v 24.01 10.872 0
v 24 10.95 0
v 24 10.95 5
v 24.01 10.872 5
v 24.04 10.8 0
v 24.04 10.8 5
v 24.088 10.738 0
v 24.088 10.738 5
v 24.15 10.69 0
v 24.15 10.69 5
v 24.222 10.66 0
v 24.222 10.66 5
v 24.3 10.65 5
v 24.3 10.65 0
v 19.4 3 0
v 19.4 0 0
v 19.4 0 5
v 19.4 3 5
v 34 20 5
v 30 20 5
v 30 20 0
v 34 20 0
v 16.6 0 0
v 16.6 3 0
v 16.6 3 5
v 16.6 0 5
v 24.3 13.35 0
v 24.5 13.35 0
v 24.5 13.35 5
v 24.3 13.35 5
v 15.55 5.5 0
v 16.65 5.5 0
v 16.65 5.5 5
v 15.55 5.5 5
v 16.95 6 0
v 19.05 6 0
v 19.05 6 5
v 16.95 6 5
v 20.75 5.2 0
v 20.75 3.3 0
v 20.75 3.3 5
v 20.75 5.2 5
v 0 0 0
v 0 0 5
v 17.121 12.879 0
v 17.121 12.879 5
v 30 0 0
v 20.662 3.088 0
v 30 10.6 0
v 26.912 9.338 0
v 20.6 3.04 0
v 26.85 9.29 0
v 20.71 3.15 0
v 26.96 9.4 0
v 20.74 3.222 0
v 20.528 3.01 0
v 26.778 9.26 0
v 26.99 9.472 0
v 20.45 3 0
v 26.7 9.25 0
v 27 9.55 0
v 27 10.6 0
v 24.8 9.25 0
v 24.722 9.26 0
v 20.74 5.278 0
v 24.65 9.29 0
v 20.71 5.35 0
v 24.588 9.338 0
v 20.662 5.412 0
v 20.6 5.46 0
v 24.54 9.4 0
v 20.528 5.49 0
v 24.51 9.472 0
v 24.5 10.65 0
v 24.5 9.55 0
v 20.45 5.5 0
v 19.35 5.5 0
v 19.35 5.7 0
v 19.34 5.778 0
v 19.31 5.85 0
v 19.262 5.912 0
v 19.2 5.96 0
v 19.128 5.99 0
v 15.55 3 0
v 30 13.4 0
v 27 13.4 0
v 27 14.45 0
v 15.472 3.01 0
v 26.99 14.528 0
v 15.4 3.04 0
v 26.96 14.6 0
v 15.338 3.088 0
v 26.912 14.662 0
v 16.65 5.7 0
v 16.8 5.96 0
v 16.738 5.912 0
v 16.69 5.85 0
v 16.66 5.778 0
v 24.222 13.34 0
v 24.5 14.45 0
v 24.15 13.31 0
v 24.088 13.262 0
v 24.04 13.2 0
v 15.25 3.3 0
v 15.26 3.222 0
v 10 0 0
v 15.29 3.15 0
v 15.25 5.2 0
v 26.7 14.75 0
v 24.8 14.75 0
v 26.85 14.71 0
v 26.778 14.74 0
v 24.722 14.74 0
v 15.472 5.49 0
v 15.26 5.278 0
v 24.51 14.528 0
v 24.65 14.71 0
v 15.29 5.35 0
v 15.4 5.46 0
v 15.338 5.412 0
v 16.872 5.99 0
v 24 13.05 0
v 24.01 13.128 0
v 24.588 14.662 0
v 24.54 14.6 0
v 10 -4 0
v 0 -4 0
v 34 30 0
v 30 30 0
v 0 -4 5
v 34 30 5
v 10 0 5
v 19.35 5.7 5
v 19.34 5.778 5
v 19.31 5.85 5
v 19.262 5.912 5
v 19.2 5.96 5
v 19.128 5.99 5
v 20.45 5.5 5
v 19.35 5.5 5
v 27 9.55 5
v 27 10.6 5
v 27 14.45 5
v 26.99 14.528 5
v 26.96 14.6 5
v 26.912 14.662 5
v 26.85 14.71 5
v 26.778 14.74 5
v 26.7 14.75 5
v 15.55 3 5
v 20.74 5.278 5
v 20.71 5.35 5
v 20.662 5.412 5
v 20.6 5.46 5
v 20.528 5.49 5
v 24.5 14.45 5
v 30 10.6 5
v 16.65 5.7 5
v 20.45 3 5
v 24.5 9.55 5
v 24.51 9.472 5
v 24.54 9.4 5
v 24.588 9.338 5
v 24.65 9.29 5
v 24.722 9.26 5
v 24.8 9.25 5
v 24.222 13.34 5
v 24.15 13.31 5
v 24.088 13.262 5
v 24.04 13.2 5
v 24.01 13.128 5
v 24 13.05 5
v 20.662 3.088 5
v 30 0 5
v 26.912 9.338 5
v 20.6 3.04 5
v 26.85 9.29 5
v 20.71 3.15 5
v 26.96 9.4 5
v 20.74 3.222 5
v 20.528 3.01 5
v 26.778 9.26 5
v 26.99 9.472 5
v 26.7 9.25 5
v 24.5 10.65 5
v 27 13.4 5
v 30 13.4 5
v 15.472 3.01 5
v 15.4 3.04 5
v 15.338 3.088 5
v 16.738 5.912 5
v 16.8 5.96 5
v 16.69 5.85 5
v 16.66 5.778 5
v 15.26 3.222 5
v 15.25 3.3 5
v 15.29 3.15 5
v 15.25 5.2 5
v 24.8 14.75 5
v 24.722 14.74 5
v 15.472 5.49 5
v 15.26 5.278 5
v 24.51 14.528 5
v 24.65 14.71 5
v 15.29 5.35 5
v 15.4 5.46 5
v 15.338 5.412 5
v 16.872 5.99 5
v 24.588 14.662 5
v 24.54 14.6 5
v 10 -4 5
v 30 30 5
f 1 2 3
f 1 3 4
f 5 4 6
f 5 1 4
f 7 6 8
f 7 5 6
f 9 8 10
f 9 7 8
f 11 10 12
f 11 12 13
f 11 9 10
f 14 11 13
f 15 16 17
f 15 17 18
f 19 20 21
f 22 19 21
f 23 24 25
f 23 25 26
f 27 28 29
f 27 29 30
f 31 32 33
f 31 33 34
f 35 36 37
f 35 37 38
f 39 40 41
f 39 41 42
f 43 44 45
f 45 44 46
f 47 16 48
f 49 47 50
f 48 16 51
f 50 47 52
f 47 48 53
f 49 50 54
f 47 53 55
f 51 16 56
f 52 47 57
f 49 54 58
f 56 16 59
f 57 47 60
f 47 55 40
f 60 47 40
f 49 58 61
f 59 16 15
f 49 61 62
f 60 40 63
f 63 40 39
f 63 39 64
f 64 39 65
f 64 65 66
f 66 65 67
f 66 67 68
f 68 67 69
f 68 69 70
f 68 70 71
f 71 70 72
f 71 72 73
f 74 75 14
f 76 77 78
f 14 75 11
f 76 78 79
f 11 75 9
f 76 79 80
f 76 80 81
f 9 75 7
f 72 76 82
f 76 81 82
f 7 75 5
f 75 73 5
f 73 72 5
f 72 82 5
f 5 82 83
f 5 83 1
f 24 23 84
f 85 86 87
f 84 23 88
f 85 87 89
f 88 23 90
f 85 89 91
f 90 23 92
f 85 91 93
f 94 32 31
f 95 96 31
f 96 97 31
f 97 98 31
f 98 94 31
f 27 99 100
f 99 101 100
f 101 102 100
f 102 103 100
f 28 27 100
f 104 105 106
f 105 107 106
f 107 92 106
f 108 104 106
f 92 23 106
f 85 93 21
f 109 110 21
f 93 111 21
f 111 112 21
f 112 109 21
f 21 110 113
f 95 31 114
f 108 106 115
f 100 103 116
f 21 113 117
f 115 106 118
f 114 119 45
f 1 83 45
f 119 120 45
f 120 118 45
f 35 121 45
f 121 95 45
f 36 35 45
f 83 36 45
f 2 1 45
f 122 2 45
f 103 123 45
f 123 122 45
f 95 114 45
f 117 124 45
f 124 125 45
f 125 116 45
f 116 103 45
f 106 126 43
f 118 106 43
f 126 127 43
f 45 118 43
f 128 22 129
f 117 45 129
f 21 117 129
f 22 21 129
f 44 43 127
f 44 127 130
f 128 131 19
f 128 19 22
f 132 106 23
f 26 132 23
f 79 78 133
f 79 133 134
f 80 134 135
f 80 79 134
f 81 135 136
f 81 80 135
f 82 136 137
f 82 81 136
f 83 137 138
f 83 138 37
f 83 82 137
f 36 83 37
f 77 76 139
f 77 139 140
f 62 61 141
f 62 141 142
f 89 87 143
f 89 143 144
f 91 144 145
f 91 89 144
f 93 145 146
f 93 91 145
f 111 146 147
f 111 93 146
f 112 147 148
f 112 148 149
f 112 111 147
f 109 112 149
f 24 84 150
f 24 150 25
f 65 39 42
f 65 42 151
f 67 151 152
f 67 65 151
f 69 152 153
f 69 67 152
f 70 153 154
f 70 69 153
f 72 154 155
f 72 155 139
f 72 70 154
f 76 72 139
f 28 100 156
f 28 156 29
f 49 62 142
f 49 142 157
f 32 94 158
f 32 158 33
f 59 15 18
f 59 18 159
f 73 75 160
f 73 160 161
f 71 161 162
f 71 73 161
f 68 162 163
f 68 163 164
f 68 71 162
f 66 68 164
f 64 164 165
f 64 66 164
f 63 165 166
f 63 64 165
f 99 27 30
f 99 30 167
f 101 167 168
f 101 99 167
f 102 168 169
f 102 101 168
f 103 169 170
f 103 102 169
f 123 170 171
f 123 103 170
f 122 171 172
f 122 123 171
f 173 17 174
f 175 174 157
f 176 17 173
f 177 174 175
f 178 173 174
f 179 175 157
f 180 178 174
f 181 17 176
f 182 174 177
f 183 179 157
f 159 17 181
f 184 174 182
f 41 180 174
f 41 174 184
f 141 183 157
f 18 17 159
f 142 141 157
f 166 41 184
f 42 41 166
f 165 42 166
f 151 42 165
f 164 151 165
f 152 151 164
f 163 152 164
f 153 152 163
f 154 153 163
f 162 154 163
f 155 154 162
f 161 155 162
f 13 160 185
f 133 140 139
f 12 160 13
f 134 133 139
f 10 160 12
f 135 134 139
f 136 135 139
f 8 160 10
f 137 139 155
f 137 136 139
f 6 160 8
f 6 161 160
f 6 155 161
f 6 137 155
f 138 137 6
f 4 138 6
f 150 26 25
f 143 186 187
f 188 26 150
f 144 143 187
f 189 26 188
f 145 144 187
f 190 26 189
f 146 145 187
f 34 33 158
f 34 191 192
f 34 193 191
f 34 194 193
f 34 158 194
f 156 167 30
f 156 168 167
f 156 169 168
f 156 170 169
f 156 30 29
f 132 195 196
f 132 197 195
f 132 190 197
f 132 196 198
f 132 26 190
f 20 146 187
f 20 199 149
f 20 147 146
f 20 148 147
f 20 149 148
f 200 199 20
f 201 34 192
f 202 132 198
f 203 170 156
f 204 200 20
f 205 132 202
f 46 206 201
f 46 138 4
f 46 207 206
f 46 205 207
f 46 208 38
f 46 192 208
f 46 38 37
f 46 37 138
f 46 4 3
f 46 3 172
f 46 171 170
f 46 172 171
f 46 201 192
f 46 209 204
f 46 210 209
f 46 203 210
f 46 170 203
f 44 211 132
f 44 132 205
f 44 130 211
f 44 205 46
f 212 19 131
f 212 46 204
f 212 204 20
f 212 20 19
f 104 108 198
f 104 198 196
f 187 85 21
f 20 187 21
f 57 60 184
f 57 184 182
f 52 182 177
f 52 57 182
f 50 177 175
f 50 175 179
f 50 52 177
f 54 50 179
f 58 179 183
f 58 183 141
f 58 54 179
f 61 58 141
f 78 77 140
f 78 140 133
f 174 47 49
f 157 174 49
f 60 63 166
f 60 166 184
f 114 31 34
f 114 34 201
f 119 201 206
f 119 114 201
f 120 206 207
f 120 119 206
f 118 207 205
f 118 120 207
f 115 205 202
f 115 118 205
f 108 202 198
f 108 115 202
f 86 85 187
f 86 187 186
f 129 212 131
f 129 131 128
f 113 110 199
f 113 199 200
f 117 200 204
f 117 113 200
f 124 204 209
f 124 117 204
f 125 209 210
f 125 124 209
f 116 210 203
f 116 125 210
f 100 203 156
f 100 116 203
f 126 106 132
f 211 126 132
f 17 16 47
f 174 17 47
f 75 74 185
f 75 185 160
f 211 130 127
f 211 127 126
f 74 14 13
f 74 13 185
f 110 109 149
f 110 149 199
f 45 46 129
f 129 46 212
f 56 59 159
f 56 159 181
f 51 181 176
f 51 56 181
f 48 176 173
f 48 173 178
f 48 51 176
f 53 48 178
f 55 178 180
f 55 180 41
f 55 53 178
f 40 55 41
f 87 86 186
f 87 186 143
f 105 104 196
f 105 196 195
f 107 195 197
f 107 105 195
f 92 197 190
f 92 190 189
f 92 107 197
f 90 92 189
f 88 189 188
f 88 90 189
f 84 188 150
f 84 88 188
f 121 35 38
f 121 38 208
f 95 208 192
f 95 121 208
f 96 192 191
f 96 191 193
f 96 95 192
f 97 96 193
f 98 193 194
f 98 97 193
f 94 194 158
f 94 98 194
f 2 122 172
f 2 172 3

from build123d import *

# Parameters (mm, degrees)
EXTRUDE_1_DEPTH     = 5
CUT_EXTRUDE_1_DEPTH = 10
SKETCH_3_W          = 10
SKETCH_3_H          = 5
EXTRUDE_2_DEPTH     = 5
SKETCH_4_W          = 5
SKETCH_4_H          = 10
EXTRUDE_3_DEPTH     = 5
SKETCH_5_W          = 10
SKETCH_5_H          = 5
CUT_EXTRUDE_2_DEPTH = 1
SKETCH_6_W          = 5
SKETCH_6_H          = 10
CUT_EXTRUDE_3_DEPTH = 1
CUT_EXTRUDE_5_DEPTH = 5


with BuildPart() as part:
    # 草图1 → 凸台-拉伸1 (new body)
    with BuildSketch(Plane.XY):
        Polygon((0, 0), (30, 0), (30, 30), align=None)
    extrude(amount=EXTRUDE_1_DEPTH)

    # 草图2 → 切除-拉伸1 (cut)
    with BuildSketch(Plane.XY.offset(5)):
        Polygon((17.121320344, 12.878679656), (15, 15), (0, 0), align=None)
        Polygon((17.121320344, 12.878679656), (30, 30), (15, 15), align=None)
    extrude(amount=-CUT_EXTRUDE_1_DEPTH, mode=Mode.SUBTRACT)

    # 草图3 → 凸台-拉伸2 (add)
    with BuildSketch(Plane.XZ):
        with Locations((5, 2.5)):
            Rectangle(SKETCH_3_W, SKETCH_3_H)
    extrude(amount=EXTRUDE_2_DEPTH)

    # 草图4 → 凸台-拉伸3 (add)
    with BuildSketch(Plane(origin=(30, 0, 0), x_dir=(0, 0, -1), z_dir=(1, 0, 0))):
        with Locations((-2.5, 25)):
            Rectangle(SKETCH_4_W, SKETCH_4_H)
    extrude(amount=EXTRUDE_3_DEPTH)

    # 草图5 → 切除-拉伸2 (cut)
    with BuildSketch(Plane.XZ.offset(5)):
        with Locations((5, 2.5)):
            Rectangle(SKETCH_5_W, SKETCH_5_H)
    extrude(amount=-CUT_EXTRUDE_2_DEPTH, mode=Mode.SUBTRACT)

    # 草图6 → 切除-拉伸3 (cut)
    with BuildSketch(Plane(origin=(35, 0, 0), x_dir=(0, 0, -1), z_dir=(1, 0, 0))):
        with Locations((-2.5, 25)):
            Rectangle(SKETCH_6_W, SKETCH_6_H)
    extrude(amount=-CUT_EXTRUDE_3_DEPTH, mode=Mode.SUBTRACT)

    # 草图8 → 切除-拉伸5 (cut)
    with BuildSketch(Plane(origin=(-129.723125666, 239.943153128, 0), x_dir=(0, 1, 0), z_dir=(0, 0, -1))):
        with BuildLine():
            Line((-229.343153128, 156.723125666), (-229.343153128, 159.223125666))
            Line((-229.343153128, 159.223125666), (-229.343153128, 161.223125666))
            Line((-229.343153128, 161.223125666), (-226.543153128, 161.223125666))
            Line((-226.543153128, 161.223125666), (-226.543153128, 159.223125666))
            Line((-226.543153128, 159.223125666), (-226.543153128, 156.723125666))
            Line((-226.543153128, 156.723125666), (-225.493153128, 156.723125666))
            ThreePointArc((-225.493153128, 156.723125666), (-225.281021094, 156.6352577), (-225.193153128, 156.423125666))
            Line((-225.193153128, 156.423125666), (-225.193153128, 154.523125666))
            ThreePointArc((-225.193153128, 154.523125666), (-225.281021094, 154.310993631), (-225.493153128, 154.223125666))
            Line((-225.493153128, 154.223125666), (-226.593153128, 154.223125666))
            Line((-226.593153128, 154.223125666), (-226.593153128, 154.023125666))
            ThreePointArc((-226.593153128, 154.023125666), (-226.681021094, 153.810993631), (-226.893153128, 153.723125666))
            Line((-226.893153128, 153.723125666), (-228.993153128, 153.723125666))
            ThreePointArc((-228.993153128, 153.723125666), (-229.205285163, 153.810993631), (-229.293153128, 154.023125666))
            Line((-229.293153128, 154.023125666), (-229.293153128, 154.223125666))
            Line((-229.293153128, 154.223125666), (-230.393153128, 154.223125666))
            ThreePointArc((-230.393153128, 154.223125666), (-230.605285163, 154.310993631), (-230.693153128, 154.523125666))
            Line((-230.693153128, 154.523125666), (-230.693153128, 156.423125666))
            ThreePointArc((-230.693153128, 156.423125666), (-230.605285163, 156.6352577), (-230.393153128, 156.723125666))
            Line((-230.393153128, 156.723125666), (-229.343153128, 156.723125666))
        make_face()
        with BuildLine():
            Line((-239.443153128, 149.123125666), (-236.943153128, 149.123125666))
            Line((-236.943153128, 149.123125666), (-236.943153128, 150.173125666))
            ThreePointArc((-236.943153128, 150.173125666), (-236.855285163, 150.3852577), (-236.643153128, 150.473125666))
            Line((-236.643153128, 150.473125666), (-234.743153128, 150.473125666))
            ThreePointArc((-234.743153128, 150.473125666), (-234.531021094, 150.3852577), (-234.443153128, 150.173125666))
            Line((-234.443153128, 150.173125666), (-234.443153128, 149.073125666))
            Line((-234.443153128, 149.073125666), (-234.243153128, 149.073125666))
            ThreePointArc((-234.243153128, 149.073125666), (-234.031021094, 148.9852577), (-233.943153128, 148.773125666))
            Line((-233.943153128, 148.773125666), (-233.943153128, 146.673125666))
            ThreePointArc((-233.943153128, 146.673125666), (-234.031021094, 146.460993631), (-234.243153128, 146.373125666))
            Line((-234.243153128, 146.373125666), (-234.443153128, 146.373125666))
            Line((-234.443153128, 146.373125666), (-234.443153128, 145.273125666))
            ThreePointArc((-234.443153128, 145.273125666), (-234.531021094, 145.060993631), (-234.743153128, 144.973125666))
            Line((-234.743153128, 144.973125666), (-236.643153128, 144.973125666))
            ThreePointArc((-236.643153128, 144.973125666), (-236.855285163, 145.060993631), (-236.943153128, 145.273125666))
            Line((-236.943153128, 145.273125666), (-236.943153128, 146.323125666))
            Line((-236.943153128, 146.323125666), (-239.443153128, 146.323125666))
            Line((-239.443153128, 146.323125666), (-241.443153128, 146.323125666))
            Line((-241.443153128, 146.323125666), (-241.443153128, 149.123125666))
            Line((-241.443153128, 149.123125666), (-239.443153128, 149.123125666))
        make_face()
    extrude(amount=-CUT_EXTRUDE_5_DEPTH, mode=Mode.SUBTRACT)


solid = part.part
